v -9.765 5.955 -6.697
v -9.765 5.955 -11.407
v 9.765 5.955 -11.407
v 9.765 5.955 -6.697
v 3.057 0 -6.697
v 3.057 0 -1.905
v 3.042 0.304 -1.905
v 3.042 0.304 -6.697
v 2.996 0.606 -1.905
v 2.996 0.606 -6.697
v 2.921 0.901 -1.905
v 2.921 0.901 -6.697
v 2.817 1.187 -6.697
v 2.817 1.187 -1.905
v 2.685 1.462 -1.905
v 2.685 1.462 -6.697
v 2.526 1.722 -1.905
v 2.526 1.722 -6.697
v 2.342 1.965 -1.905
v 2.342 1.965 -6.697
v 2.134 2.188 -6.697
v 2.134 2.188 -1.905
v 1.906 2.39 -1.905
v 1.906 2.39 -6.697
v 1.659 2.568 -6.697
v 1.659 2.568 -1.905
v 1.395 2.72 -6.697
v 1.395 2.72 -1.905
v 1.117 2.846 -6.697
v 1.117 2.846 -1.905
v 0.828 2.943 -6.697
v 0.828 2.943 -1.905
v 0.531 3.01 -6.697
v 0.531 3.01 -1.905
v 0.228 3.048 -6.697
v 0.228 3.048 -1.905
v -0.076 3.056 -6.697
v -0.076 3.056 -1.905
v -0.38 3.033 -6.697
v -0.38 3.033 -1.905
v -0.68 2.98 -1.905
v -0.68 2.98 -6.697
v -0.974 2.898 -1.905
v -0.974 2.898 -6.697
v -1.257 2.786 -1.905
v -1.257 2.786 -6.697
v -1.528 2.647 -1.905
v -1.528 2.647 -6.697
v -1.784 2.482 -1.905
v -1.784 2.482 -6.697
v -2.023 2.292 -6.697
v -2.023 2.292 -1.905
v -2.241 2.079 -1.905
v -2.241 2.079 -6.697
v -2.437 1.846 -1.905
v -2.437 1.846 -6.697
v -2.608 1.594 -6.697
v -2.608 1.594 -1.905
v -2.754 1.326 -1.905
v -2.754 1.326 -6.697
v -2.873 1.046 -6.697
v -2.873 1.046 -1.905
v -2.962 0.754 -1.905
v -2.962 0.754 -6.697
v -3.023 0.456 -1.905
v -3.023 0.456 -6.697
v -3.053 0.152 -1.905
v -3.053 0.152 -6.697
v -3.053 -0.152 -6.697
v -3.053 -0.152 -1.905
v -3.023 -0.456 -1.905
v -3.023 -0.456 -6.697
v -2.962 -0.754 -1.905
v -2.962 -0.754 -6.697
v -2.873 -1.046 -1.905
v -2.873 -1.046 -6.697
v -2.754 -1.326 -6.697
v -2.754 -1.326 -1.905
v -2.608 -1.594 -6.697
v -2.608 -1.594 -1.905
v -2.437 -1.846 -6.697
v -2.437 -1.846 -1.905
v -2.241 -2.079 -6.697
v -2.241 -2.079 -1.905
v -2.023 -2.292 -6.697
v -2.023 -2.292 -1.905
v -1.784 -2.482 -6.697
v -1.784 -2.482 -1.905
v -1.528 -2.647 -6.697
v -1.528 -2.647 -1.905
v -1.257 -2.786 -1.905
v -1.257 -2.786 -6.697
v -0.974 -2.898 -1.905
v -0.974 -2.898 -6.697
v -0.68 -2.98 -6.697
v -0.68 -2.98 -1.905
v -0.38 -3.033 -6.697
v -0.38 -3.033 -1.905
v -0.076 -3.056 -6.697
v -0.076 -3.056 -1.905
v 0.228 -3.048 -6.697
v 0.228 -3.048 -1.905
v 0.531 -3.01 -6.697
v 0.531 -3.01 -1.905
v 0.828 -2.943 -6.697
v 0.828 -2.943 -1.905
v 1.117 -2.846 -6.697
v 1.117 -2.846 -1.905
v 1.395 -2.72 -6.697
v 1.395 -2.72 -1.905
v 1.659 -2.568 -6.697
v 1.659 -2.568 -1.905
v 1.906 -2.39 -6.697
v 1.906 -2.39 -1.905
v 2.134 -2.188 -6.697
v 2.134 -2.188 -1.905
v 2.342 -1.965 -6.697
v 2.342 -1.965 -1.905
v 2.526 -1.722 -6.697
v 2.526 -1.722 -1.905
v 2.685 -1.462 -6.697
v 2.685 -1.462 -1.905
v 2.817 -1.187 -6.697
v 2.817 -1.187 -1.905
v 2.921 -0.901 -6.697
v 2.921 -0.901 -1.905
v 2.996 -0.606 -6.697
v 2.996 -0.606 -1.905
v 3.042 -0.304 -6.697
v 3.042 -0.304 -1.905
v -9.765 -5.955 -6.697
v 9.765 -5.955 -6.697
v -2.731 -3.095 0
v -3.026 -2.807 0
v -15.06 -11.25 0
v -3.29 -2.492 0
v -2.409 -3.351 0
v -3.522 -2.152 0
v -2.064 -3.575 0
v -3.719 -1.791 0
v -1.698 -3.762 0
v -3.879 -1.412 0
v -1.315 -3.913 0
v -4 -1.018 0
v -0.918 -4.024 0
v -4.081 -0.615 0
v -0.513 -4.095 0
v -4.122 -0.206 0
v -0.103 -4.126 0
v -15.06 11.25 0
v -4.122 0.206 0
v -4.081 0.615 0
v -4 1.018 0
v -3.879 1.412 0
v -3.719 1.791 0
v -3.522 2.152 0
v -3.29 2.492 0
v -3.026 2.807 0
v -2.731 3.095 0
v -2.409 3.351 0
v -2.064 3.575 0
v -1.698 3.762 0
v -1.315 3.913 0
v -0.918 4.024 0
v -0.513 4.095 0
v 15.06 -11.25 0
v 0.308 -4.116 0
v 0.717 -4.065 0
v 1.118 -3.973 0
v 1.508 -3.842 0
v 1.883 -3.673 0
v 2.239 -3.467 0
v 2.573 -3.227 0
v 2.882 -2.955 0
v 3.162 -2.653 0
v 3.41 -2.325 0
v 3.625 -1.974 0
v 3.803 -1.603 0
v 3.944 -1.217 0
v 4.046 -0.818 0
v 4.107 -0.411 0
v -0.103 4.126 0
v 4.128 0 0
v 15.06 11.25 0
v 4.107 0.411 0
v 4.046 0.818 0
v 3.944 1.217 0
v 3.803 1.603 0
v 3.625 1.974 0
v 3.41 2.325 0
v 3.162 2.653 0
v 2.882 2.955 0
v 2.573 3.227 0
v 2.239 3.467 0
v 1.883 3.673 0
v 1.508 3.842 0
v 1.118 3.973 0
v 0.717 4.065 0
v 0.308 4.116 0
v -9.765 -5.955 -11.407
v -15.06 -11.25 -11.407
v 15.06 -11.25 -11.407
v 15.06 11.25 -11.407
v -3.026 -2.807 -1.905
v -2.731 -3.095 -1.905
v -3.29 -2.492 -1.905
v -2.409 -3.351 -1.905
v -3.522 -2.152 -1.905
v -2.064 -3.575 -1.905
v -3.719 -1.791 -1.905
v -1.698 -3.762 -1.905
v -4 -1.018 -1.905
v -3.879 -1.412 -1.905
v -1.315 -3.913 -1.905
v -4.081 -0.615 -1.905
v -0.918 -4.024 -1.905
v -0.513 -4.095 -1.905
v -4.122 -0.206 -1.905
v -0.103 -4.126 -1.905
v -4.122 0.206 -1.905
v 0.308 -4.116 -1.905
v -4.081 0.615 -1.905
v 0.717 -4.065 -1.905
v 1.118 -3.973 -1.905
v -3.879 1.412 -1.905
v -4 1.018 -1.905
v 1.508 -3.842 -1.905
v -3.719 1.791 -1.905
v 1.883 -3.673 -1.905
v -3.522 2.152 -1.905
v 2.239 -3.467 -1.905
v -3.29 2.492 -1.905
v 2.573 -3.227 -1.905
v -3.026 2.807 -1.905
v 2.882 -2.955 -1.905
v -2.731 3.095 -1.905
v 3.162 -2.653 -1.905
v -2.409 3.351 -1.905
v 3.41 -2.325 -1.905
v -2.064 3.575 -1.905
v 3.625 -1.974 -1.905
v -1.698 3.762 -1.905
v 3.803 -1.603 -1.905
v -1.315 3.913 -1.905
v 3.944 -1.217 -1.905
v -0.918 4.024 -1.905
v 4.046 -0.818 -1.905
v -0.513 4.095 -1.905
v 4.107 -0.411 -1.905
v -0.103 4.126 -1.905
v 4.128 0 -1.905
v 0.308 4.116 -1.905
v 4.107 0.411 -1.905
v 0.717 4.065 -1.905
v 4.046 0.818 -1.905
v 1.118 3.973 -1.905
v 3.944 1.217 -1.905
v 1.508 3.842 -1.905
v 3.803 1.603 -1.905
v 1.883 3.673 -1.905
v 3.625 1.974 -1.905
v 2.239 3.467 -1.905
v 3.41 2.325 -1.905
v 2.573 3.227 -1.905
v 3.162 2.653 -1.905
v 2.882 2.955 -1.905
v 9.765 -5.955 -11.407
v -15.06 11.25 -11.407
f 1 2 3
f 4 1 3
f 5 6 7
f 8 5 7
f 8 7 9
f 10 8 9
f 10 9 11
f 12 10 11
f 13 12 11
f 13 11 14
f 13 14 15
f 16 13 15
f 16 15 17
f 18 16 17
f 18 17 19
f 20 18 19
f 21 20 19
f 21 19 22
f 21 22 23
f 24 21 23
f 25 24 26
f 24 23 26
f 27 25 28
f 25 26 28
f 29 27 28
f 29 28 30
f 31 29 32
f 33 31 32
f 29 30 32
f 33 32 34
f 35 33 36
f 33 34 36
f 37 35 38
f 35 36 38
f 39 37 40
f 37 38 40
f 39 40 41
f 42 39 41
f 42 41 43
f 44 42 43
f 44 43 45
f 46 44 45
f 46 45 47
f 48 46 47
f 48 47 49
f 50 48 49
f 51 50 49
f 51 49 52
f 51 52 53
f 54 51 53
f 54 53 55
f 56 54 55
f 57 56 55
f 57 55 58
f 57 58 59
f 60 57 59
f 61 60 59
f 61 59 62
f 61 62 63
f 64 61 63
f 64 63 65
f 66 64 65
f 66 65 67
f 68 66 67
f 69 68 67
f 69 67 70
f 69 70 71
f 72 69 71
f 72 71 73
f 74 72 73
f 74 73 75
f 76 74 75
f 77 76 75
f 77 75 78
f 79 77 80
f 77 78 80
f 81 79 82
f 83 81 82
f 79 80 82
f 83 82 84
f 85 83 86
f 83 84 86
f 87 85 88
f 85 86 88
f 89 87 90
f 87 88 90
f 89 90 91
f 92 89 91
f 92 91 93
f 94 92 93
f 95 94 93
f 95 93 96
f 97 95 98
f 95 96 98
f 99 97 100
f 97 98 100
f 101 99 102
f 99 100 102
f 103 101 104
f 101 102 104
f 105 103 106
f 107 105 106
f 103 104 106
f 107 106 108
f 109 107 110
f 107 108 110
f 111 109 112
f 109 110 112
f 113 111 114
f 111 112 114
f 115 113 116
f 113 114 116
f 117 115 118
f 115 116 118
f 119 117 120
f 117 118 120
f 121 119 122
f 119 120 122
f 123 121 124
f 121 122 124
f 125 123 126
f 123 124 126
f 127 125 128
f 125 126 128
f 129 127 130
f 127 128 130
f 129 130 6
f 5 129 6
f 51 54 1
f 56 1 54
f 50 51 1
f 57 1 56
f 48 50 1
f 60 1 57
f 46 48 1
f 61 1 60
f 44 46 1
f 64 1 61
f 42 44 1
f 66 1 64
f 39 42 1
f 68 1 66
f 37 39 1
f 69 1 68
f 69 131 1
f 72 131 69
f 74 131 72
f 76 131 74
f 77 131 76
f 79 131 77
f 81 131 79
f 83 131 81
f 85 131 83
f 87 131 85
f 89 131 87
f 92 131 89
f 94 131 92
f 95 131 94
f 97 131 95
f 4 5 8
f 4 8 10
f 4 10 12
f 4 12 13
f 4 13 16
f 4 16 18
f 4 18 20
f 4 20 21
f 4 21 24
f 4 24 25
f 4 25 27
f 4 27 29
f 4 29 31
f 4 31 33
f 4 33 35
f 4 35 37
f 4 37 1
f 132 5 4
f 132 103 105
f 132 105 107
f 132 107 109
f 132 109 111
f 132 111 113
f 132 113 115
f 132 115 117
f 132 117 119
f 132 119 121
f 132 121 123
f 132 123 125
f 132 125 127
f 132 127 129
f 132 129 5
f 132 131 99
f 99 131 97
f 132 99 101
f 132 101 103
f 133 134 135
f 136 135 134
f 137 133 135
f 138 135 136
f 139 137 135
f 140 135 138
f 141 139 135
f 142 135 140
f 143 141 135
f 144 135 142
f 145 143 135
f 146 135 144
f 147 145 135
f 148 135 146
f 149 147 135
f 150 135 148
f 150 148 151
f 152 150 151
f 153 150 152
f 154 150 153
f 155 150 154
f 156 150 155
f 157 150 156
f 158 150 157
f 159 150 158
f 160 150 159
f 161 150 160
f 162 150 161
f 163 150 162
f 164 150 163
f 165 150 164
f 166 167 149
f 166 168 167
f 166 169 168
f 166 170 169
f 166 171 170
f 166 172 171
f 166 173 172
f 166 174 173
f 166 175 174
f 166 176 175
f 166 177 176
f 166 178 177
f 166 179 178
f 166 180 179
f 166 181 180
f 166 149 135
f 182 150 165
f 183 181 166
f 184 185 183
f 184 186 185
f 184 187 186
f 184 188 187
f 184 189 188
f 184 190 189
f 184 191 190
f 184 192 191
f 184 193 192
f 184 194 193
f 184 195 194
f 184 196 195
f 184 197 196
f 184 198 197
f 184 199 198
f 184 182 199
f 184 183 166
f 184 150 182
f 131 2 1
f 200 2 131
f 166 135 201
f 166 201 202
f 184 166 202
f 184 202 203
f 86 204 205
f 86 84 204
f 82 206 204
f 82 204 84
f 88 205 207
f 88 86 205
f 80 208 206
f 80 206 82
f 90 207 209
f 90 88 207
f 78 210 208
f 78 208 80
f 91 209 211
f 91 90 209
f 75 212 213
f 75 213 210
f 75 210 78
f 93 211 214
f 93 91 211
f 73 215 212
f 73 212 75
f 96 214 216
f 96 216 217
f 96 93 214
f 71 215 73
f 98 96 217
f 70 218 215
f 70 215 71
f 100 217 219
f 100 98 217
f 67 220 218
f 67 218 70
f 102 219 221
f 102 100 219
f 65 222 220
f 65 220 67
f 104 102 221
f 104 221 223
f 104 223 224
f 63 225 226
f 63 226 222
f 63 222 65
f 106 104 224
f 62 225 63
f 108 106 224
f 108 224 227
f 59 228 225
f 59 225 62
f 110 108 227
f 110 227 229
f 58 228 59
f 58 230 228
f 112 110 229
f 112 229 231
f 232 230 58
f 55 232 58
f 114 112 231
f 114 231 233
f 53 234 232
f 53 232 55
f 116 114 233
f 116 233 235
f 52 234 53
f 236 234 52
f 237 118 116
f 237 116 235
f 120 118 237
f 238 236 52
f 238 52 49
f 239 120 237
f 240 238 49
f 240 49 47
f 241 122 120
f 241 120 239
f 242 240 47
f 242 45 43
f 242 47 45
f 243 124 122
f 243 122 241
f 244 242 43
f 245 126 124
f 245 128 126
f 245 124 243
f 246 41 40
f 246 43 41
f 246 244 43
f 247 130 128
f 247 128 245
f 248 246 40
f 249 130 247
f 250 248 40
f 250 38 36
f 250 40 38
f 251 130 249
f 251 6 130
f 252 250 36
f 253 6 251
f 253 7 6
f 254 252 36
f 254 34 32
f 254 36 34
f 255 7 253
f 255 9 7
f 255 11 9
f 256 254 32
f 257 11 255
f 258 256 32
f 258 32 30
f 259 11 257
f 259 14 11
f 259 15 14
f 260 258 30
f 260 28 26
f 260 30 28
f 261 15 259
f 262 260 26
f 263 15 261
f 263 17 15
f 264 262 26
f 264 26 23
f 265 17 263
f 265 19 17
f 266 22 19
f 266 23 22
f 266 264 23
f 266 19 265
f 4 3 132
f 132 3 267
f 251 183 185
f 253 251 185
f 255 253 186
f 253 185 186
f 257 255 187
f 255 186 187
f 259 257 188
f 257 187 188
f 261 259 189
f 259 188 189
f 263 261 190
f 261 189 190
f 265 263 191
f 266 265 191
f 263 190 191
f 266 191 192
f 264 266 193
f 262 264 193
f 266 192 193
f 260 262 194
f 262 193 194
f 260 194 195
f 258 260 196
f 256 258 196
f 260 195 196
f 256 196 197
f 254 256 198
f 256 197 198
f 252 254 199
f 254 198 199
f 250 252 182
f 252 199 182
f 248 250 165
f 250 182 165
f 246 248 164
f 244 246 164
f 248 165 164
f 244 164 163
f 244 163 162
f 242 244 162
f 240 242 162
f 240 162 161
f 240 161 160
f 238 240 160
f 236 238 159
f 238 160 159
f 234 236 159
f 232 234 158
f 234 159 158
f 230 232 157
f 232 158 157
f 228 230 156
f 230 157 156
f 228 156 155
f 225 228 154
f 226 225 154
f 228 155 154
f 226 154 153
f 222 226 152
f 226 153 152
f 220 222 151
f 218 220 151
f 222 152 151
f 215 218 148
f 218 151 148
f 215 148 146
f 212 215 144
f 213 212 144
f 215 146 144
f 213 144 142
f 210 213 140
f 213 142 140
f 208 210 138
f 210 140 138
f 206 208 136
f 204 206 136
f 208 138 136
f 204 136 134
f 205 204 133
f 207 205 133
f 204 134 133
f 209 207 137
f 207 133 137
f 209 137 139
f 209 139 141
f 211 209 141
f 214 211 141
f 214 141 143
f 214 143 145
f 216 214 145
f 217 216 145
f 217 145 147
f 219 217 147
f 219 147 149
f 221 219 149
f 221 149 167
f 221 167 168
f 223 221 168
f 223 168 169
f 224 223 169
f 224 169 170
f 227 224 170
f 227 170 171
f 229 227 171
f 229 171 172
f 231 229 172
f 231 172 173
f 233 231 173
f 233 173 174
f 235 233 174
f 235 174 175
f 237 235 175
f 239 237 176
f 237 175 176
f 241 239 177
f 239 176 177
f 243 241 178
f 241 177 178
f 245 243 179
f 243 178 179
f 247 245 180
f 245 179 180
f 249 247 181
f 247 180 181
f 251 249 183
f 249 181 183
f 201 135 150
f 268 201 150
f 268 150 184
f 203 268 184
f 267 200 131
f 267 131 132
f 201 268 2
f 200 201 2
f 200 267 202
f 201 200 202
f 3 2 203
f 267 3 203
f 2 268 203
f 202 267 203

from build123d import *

# Parameters (mm, degrees)
F0_W     = 30.12
F0_H     = 22.5
F1_DEPTH = 11.407
F2_W     = 19.53
F2_H     = 11.91
F3_DEPTH = 4.71
F4_R     = 4.1275
F5_DEPTH = 1.905
F6_R     = 3.05689
F7_DEPTH = 6.0706


with BuildPart() as f1:
    # F0 (on Top) → F1 (new body)
    with BuildSketch(Plane.XY):
        Rectangle(F0_W, F0_H)
    extrude(amount=-F1_DEPTH)

    # F2 (on face) → F3 (cut)
    with BuildSketch(Plane(origin=(0, 0, -11.407), x_dir=(1, 0, 0), z_dir=(0, 0, -1))):
        Rectangle(F2_W, F2_H)
    extrude(amount=-F3_DEPTH, mode=Mode.SUBTRACT)

    # F4 (on face) → F5 (cut)
    with BuildSketch(Plane.XY):
        Circle(F4_R)
    extrude(amount=-F5_DEPTH, mode=Mode.SUBTRACT)

    # F6 (on face) → F7 (cut)
    with BuildSketch(Plane.XY.offset(-1.905)):
        Circle(F6_R)
    extrude(amount=-F7_DEPTH, mode=Mode.SUBTRACT)


solid = f1.part
